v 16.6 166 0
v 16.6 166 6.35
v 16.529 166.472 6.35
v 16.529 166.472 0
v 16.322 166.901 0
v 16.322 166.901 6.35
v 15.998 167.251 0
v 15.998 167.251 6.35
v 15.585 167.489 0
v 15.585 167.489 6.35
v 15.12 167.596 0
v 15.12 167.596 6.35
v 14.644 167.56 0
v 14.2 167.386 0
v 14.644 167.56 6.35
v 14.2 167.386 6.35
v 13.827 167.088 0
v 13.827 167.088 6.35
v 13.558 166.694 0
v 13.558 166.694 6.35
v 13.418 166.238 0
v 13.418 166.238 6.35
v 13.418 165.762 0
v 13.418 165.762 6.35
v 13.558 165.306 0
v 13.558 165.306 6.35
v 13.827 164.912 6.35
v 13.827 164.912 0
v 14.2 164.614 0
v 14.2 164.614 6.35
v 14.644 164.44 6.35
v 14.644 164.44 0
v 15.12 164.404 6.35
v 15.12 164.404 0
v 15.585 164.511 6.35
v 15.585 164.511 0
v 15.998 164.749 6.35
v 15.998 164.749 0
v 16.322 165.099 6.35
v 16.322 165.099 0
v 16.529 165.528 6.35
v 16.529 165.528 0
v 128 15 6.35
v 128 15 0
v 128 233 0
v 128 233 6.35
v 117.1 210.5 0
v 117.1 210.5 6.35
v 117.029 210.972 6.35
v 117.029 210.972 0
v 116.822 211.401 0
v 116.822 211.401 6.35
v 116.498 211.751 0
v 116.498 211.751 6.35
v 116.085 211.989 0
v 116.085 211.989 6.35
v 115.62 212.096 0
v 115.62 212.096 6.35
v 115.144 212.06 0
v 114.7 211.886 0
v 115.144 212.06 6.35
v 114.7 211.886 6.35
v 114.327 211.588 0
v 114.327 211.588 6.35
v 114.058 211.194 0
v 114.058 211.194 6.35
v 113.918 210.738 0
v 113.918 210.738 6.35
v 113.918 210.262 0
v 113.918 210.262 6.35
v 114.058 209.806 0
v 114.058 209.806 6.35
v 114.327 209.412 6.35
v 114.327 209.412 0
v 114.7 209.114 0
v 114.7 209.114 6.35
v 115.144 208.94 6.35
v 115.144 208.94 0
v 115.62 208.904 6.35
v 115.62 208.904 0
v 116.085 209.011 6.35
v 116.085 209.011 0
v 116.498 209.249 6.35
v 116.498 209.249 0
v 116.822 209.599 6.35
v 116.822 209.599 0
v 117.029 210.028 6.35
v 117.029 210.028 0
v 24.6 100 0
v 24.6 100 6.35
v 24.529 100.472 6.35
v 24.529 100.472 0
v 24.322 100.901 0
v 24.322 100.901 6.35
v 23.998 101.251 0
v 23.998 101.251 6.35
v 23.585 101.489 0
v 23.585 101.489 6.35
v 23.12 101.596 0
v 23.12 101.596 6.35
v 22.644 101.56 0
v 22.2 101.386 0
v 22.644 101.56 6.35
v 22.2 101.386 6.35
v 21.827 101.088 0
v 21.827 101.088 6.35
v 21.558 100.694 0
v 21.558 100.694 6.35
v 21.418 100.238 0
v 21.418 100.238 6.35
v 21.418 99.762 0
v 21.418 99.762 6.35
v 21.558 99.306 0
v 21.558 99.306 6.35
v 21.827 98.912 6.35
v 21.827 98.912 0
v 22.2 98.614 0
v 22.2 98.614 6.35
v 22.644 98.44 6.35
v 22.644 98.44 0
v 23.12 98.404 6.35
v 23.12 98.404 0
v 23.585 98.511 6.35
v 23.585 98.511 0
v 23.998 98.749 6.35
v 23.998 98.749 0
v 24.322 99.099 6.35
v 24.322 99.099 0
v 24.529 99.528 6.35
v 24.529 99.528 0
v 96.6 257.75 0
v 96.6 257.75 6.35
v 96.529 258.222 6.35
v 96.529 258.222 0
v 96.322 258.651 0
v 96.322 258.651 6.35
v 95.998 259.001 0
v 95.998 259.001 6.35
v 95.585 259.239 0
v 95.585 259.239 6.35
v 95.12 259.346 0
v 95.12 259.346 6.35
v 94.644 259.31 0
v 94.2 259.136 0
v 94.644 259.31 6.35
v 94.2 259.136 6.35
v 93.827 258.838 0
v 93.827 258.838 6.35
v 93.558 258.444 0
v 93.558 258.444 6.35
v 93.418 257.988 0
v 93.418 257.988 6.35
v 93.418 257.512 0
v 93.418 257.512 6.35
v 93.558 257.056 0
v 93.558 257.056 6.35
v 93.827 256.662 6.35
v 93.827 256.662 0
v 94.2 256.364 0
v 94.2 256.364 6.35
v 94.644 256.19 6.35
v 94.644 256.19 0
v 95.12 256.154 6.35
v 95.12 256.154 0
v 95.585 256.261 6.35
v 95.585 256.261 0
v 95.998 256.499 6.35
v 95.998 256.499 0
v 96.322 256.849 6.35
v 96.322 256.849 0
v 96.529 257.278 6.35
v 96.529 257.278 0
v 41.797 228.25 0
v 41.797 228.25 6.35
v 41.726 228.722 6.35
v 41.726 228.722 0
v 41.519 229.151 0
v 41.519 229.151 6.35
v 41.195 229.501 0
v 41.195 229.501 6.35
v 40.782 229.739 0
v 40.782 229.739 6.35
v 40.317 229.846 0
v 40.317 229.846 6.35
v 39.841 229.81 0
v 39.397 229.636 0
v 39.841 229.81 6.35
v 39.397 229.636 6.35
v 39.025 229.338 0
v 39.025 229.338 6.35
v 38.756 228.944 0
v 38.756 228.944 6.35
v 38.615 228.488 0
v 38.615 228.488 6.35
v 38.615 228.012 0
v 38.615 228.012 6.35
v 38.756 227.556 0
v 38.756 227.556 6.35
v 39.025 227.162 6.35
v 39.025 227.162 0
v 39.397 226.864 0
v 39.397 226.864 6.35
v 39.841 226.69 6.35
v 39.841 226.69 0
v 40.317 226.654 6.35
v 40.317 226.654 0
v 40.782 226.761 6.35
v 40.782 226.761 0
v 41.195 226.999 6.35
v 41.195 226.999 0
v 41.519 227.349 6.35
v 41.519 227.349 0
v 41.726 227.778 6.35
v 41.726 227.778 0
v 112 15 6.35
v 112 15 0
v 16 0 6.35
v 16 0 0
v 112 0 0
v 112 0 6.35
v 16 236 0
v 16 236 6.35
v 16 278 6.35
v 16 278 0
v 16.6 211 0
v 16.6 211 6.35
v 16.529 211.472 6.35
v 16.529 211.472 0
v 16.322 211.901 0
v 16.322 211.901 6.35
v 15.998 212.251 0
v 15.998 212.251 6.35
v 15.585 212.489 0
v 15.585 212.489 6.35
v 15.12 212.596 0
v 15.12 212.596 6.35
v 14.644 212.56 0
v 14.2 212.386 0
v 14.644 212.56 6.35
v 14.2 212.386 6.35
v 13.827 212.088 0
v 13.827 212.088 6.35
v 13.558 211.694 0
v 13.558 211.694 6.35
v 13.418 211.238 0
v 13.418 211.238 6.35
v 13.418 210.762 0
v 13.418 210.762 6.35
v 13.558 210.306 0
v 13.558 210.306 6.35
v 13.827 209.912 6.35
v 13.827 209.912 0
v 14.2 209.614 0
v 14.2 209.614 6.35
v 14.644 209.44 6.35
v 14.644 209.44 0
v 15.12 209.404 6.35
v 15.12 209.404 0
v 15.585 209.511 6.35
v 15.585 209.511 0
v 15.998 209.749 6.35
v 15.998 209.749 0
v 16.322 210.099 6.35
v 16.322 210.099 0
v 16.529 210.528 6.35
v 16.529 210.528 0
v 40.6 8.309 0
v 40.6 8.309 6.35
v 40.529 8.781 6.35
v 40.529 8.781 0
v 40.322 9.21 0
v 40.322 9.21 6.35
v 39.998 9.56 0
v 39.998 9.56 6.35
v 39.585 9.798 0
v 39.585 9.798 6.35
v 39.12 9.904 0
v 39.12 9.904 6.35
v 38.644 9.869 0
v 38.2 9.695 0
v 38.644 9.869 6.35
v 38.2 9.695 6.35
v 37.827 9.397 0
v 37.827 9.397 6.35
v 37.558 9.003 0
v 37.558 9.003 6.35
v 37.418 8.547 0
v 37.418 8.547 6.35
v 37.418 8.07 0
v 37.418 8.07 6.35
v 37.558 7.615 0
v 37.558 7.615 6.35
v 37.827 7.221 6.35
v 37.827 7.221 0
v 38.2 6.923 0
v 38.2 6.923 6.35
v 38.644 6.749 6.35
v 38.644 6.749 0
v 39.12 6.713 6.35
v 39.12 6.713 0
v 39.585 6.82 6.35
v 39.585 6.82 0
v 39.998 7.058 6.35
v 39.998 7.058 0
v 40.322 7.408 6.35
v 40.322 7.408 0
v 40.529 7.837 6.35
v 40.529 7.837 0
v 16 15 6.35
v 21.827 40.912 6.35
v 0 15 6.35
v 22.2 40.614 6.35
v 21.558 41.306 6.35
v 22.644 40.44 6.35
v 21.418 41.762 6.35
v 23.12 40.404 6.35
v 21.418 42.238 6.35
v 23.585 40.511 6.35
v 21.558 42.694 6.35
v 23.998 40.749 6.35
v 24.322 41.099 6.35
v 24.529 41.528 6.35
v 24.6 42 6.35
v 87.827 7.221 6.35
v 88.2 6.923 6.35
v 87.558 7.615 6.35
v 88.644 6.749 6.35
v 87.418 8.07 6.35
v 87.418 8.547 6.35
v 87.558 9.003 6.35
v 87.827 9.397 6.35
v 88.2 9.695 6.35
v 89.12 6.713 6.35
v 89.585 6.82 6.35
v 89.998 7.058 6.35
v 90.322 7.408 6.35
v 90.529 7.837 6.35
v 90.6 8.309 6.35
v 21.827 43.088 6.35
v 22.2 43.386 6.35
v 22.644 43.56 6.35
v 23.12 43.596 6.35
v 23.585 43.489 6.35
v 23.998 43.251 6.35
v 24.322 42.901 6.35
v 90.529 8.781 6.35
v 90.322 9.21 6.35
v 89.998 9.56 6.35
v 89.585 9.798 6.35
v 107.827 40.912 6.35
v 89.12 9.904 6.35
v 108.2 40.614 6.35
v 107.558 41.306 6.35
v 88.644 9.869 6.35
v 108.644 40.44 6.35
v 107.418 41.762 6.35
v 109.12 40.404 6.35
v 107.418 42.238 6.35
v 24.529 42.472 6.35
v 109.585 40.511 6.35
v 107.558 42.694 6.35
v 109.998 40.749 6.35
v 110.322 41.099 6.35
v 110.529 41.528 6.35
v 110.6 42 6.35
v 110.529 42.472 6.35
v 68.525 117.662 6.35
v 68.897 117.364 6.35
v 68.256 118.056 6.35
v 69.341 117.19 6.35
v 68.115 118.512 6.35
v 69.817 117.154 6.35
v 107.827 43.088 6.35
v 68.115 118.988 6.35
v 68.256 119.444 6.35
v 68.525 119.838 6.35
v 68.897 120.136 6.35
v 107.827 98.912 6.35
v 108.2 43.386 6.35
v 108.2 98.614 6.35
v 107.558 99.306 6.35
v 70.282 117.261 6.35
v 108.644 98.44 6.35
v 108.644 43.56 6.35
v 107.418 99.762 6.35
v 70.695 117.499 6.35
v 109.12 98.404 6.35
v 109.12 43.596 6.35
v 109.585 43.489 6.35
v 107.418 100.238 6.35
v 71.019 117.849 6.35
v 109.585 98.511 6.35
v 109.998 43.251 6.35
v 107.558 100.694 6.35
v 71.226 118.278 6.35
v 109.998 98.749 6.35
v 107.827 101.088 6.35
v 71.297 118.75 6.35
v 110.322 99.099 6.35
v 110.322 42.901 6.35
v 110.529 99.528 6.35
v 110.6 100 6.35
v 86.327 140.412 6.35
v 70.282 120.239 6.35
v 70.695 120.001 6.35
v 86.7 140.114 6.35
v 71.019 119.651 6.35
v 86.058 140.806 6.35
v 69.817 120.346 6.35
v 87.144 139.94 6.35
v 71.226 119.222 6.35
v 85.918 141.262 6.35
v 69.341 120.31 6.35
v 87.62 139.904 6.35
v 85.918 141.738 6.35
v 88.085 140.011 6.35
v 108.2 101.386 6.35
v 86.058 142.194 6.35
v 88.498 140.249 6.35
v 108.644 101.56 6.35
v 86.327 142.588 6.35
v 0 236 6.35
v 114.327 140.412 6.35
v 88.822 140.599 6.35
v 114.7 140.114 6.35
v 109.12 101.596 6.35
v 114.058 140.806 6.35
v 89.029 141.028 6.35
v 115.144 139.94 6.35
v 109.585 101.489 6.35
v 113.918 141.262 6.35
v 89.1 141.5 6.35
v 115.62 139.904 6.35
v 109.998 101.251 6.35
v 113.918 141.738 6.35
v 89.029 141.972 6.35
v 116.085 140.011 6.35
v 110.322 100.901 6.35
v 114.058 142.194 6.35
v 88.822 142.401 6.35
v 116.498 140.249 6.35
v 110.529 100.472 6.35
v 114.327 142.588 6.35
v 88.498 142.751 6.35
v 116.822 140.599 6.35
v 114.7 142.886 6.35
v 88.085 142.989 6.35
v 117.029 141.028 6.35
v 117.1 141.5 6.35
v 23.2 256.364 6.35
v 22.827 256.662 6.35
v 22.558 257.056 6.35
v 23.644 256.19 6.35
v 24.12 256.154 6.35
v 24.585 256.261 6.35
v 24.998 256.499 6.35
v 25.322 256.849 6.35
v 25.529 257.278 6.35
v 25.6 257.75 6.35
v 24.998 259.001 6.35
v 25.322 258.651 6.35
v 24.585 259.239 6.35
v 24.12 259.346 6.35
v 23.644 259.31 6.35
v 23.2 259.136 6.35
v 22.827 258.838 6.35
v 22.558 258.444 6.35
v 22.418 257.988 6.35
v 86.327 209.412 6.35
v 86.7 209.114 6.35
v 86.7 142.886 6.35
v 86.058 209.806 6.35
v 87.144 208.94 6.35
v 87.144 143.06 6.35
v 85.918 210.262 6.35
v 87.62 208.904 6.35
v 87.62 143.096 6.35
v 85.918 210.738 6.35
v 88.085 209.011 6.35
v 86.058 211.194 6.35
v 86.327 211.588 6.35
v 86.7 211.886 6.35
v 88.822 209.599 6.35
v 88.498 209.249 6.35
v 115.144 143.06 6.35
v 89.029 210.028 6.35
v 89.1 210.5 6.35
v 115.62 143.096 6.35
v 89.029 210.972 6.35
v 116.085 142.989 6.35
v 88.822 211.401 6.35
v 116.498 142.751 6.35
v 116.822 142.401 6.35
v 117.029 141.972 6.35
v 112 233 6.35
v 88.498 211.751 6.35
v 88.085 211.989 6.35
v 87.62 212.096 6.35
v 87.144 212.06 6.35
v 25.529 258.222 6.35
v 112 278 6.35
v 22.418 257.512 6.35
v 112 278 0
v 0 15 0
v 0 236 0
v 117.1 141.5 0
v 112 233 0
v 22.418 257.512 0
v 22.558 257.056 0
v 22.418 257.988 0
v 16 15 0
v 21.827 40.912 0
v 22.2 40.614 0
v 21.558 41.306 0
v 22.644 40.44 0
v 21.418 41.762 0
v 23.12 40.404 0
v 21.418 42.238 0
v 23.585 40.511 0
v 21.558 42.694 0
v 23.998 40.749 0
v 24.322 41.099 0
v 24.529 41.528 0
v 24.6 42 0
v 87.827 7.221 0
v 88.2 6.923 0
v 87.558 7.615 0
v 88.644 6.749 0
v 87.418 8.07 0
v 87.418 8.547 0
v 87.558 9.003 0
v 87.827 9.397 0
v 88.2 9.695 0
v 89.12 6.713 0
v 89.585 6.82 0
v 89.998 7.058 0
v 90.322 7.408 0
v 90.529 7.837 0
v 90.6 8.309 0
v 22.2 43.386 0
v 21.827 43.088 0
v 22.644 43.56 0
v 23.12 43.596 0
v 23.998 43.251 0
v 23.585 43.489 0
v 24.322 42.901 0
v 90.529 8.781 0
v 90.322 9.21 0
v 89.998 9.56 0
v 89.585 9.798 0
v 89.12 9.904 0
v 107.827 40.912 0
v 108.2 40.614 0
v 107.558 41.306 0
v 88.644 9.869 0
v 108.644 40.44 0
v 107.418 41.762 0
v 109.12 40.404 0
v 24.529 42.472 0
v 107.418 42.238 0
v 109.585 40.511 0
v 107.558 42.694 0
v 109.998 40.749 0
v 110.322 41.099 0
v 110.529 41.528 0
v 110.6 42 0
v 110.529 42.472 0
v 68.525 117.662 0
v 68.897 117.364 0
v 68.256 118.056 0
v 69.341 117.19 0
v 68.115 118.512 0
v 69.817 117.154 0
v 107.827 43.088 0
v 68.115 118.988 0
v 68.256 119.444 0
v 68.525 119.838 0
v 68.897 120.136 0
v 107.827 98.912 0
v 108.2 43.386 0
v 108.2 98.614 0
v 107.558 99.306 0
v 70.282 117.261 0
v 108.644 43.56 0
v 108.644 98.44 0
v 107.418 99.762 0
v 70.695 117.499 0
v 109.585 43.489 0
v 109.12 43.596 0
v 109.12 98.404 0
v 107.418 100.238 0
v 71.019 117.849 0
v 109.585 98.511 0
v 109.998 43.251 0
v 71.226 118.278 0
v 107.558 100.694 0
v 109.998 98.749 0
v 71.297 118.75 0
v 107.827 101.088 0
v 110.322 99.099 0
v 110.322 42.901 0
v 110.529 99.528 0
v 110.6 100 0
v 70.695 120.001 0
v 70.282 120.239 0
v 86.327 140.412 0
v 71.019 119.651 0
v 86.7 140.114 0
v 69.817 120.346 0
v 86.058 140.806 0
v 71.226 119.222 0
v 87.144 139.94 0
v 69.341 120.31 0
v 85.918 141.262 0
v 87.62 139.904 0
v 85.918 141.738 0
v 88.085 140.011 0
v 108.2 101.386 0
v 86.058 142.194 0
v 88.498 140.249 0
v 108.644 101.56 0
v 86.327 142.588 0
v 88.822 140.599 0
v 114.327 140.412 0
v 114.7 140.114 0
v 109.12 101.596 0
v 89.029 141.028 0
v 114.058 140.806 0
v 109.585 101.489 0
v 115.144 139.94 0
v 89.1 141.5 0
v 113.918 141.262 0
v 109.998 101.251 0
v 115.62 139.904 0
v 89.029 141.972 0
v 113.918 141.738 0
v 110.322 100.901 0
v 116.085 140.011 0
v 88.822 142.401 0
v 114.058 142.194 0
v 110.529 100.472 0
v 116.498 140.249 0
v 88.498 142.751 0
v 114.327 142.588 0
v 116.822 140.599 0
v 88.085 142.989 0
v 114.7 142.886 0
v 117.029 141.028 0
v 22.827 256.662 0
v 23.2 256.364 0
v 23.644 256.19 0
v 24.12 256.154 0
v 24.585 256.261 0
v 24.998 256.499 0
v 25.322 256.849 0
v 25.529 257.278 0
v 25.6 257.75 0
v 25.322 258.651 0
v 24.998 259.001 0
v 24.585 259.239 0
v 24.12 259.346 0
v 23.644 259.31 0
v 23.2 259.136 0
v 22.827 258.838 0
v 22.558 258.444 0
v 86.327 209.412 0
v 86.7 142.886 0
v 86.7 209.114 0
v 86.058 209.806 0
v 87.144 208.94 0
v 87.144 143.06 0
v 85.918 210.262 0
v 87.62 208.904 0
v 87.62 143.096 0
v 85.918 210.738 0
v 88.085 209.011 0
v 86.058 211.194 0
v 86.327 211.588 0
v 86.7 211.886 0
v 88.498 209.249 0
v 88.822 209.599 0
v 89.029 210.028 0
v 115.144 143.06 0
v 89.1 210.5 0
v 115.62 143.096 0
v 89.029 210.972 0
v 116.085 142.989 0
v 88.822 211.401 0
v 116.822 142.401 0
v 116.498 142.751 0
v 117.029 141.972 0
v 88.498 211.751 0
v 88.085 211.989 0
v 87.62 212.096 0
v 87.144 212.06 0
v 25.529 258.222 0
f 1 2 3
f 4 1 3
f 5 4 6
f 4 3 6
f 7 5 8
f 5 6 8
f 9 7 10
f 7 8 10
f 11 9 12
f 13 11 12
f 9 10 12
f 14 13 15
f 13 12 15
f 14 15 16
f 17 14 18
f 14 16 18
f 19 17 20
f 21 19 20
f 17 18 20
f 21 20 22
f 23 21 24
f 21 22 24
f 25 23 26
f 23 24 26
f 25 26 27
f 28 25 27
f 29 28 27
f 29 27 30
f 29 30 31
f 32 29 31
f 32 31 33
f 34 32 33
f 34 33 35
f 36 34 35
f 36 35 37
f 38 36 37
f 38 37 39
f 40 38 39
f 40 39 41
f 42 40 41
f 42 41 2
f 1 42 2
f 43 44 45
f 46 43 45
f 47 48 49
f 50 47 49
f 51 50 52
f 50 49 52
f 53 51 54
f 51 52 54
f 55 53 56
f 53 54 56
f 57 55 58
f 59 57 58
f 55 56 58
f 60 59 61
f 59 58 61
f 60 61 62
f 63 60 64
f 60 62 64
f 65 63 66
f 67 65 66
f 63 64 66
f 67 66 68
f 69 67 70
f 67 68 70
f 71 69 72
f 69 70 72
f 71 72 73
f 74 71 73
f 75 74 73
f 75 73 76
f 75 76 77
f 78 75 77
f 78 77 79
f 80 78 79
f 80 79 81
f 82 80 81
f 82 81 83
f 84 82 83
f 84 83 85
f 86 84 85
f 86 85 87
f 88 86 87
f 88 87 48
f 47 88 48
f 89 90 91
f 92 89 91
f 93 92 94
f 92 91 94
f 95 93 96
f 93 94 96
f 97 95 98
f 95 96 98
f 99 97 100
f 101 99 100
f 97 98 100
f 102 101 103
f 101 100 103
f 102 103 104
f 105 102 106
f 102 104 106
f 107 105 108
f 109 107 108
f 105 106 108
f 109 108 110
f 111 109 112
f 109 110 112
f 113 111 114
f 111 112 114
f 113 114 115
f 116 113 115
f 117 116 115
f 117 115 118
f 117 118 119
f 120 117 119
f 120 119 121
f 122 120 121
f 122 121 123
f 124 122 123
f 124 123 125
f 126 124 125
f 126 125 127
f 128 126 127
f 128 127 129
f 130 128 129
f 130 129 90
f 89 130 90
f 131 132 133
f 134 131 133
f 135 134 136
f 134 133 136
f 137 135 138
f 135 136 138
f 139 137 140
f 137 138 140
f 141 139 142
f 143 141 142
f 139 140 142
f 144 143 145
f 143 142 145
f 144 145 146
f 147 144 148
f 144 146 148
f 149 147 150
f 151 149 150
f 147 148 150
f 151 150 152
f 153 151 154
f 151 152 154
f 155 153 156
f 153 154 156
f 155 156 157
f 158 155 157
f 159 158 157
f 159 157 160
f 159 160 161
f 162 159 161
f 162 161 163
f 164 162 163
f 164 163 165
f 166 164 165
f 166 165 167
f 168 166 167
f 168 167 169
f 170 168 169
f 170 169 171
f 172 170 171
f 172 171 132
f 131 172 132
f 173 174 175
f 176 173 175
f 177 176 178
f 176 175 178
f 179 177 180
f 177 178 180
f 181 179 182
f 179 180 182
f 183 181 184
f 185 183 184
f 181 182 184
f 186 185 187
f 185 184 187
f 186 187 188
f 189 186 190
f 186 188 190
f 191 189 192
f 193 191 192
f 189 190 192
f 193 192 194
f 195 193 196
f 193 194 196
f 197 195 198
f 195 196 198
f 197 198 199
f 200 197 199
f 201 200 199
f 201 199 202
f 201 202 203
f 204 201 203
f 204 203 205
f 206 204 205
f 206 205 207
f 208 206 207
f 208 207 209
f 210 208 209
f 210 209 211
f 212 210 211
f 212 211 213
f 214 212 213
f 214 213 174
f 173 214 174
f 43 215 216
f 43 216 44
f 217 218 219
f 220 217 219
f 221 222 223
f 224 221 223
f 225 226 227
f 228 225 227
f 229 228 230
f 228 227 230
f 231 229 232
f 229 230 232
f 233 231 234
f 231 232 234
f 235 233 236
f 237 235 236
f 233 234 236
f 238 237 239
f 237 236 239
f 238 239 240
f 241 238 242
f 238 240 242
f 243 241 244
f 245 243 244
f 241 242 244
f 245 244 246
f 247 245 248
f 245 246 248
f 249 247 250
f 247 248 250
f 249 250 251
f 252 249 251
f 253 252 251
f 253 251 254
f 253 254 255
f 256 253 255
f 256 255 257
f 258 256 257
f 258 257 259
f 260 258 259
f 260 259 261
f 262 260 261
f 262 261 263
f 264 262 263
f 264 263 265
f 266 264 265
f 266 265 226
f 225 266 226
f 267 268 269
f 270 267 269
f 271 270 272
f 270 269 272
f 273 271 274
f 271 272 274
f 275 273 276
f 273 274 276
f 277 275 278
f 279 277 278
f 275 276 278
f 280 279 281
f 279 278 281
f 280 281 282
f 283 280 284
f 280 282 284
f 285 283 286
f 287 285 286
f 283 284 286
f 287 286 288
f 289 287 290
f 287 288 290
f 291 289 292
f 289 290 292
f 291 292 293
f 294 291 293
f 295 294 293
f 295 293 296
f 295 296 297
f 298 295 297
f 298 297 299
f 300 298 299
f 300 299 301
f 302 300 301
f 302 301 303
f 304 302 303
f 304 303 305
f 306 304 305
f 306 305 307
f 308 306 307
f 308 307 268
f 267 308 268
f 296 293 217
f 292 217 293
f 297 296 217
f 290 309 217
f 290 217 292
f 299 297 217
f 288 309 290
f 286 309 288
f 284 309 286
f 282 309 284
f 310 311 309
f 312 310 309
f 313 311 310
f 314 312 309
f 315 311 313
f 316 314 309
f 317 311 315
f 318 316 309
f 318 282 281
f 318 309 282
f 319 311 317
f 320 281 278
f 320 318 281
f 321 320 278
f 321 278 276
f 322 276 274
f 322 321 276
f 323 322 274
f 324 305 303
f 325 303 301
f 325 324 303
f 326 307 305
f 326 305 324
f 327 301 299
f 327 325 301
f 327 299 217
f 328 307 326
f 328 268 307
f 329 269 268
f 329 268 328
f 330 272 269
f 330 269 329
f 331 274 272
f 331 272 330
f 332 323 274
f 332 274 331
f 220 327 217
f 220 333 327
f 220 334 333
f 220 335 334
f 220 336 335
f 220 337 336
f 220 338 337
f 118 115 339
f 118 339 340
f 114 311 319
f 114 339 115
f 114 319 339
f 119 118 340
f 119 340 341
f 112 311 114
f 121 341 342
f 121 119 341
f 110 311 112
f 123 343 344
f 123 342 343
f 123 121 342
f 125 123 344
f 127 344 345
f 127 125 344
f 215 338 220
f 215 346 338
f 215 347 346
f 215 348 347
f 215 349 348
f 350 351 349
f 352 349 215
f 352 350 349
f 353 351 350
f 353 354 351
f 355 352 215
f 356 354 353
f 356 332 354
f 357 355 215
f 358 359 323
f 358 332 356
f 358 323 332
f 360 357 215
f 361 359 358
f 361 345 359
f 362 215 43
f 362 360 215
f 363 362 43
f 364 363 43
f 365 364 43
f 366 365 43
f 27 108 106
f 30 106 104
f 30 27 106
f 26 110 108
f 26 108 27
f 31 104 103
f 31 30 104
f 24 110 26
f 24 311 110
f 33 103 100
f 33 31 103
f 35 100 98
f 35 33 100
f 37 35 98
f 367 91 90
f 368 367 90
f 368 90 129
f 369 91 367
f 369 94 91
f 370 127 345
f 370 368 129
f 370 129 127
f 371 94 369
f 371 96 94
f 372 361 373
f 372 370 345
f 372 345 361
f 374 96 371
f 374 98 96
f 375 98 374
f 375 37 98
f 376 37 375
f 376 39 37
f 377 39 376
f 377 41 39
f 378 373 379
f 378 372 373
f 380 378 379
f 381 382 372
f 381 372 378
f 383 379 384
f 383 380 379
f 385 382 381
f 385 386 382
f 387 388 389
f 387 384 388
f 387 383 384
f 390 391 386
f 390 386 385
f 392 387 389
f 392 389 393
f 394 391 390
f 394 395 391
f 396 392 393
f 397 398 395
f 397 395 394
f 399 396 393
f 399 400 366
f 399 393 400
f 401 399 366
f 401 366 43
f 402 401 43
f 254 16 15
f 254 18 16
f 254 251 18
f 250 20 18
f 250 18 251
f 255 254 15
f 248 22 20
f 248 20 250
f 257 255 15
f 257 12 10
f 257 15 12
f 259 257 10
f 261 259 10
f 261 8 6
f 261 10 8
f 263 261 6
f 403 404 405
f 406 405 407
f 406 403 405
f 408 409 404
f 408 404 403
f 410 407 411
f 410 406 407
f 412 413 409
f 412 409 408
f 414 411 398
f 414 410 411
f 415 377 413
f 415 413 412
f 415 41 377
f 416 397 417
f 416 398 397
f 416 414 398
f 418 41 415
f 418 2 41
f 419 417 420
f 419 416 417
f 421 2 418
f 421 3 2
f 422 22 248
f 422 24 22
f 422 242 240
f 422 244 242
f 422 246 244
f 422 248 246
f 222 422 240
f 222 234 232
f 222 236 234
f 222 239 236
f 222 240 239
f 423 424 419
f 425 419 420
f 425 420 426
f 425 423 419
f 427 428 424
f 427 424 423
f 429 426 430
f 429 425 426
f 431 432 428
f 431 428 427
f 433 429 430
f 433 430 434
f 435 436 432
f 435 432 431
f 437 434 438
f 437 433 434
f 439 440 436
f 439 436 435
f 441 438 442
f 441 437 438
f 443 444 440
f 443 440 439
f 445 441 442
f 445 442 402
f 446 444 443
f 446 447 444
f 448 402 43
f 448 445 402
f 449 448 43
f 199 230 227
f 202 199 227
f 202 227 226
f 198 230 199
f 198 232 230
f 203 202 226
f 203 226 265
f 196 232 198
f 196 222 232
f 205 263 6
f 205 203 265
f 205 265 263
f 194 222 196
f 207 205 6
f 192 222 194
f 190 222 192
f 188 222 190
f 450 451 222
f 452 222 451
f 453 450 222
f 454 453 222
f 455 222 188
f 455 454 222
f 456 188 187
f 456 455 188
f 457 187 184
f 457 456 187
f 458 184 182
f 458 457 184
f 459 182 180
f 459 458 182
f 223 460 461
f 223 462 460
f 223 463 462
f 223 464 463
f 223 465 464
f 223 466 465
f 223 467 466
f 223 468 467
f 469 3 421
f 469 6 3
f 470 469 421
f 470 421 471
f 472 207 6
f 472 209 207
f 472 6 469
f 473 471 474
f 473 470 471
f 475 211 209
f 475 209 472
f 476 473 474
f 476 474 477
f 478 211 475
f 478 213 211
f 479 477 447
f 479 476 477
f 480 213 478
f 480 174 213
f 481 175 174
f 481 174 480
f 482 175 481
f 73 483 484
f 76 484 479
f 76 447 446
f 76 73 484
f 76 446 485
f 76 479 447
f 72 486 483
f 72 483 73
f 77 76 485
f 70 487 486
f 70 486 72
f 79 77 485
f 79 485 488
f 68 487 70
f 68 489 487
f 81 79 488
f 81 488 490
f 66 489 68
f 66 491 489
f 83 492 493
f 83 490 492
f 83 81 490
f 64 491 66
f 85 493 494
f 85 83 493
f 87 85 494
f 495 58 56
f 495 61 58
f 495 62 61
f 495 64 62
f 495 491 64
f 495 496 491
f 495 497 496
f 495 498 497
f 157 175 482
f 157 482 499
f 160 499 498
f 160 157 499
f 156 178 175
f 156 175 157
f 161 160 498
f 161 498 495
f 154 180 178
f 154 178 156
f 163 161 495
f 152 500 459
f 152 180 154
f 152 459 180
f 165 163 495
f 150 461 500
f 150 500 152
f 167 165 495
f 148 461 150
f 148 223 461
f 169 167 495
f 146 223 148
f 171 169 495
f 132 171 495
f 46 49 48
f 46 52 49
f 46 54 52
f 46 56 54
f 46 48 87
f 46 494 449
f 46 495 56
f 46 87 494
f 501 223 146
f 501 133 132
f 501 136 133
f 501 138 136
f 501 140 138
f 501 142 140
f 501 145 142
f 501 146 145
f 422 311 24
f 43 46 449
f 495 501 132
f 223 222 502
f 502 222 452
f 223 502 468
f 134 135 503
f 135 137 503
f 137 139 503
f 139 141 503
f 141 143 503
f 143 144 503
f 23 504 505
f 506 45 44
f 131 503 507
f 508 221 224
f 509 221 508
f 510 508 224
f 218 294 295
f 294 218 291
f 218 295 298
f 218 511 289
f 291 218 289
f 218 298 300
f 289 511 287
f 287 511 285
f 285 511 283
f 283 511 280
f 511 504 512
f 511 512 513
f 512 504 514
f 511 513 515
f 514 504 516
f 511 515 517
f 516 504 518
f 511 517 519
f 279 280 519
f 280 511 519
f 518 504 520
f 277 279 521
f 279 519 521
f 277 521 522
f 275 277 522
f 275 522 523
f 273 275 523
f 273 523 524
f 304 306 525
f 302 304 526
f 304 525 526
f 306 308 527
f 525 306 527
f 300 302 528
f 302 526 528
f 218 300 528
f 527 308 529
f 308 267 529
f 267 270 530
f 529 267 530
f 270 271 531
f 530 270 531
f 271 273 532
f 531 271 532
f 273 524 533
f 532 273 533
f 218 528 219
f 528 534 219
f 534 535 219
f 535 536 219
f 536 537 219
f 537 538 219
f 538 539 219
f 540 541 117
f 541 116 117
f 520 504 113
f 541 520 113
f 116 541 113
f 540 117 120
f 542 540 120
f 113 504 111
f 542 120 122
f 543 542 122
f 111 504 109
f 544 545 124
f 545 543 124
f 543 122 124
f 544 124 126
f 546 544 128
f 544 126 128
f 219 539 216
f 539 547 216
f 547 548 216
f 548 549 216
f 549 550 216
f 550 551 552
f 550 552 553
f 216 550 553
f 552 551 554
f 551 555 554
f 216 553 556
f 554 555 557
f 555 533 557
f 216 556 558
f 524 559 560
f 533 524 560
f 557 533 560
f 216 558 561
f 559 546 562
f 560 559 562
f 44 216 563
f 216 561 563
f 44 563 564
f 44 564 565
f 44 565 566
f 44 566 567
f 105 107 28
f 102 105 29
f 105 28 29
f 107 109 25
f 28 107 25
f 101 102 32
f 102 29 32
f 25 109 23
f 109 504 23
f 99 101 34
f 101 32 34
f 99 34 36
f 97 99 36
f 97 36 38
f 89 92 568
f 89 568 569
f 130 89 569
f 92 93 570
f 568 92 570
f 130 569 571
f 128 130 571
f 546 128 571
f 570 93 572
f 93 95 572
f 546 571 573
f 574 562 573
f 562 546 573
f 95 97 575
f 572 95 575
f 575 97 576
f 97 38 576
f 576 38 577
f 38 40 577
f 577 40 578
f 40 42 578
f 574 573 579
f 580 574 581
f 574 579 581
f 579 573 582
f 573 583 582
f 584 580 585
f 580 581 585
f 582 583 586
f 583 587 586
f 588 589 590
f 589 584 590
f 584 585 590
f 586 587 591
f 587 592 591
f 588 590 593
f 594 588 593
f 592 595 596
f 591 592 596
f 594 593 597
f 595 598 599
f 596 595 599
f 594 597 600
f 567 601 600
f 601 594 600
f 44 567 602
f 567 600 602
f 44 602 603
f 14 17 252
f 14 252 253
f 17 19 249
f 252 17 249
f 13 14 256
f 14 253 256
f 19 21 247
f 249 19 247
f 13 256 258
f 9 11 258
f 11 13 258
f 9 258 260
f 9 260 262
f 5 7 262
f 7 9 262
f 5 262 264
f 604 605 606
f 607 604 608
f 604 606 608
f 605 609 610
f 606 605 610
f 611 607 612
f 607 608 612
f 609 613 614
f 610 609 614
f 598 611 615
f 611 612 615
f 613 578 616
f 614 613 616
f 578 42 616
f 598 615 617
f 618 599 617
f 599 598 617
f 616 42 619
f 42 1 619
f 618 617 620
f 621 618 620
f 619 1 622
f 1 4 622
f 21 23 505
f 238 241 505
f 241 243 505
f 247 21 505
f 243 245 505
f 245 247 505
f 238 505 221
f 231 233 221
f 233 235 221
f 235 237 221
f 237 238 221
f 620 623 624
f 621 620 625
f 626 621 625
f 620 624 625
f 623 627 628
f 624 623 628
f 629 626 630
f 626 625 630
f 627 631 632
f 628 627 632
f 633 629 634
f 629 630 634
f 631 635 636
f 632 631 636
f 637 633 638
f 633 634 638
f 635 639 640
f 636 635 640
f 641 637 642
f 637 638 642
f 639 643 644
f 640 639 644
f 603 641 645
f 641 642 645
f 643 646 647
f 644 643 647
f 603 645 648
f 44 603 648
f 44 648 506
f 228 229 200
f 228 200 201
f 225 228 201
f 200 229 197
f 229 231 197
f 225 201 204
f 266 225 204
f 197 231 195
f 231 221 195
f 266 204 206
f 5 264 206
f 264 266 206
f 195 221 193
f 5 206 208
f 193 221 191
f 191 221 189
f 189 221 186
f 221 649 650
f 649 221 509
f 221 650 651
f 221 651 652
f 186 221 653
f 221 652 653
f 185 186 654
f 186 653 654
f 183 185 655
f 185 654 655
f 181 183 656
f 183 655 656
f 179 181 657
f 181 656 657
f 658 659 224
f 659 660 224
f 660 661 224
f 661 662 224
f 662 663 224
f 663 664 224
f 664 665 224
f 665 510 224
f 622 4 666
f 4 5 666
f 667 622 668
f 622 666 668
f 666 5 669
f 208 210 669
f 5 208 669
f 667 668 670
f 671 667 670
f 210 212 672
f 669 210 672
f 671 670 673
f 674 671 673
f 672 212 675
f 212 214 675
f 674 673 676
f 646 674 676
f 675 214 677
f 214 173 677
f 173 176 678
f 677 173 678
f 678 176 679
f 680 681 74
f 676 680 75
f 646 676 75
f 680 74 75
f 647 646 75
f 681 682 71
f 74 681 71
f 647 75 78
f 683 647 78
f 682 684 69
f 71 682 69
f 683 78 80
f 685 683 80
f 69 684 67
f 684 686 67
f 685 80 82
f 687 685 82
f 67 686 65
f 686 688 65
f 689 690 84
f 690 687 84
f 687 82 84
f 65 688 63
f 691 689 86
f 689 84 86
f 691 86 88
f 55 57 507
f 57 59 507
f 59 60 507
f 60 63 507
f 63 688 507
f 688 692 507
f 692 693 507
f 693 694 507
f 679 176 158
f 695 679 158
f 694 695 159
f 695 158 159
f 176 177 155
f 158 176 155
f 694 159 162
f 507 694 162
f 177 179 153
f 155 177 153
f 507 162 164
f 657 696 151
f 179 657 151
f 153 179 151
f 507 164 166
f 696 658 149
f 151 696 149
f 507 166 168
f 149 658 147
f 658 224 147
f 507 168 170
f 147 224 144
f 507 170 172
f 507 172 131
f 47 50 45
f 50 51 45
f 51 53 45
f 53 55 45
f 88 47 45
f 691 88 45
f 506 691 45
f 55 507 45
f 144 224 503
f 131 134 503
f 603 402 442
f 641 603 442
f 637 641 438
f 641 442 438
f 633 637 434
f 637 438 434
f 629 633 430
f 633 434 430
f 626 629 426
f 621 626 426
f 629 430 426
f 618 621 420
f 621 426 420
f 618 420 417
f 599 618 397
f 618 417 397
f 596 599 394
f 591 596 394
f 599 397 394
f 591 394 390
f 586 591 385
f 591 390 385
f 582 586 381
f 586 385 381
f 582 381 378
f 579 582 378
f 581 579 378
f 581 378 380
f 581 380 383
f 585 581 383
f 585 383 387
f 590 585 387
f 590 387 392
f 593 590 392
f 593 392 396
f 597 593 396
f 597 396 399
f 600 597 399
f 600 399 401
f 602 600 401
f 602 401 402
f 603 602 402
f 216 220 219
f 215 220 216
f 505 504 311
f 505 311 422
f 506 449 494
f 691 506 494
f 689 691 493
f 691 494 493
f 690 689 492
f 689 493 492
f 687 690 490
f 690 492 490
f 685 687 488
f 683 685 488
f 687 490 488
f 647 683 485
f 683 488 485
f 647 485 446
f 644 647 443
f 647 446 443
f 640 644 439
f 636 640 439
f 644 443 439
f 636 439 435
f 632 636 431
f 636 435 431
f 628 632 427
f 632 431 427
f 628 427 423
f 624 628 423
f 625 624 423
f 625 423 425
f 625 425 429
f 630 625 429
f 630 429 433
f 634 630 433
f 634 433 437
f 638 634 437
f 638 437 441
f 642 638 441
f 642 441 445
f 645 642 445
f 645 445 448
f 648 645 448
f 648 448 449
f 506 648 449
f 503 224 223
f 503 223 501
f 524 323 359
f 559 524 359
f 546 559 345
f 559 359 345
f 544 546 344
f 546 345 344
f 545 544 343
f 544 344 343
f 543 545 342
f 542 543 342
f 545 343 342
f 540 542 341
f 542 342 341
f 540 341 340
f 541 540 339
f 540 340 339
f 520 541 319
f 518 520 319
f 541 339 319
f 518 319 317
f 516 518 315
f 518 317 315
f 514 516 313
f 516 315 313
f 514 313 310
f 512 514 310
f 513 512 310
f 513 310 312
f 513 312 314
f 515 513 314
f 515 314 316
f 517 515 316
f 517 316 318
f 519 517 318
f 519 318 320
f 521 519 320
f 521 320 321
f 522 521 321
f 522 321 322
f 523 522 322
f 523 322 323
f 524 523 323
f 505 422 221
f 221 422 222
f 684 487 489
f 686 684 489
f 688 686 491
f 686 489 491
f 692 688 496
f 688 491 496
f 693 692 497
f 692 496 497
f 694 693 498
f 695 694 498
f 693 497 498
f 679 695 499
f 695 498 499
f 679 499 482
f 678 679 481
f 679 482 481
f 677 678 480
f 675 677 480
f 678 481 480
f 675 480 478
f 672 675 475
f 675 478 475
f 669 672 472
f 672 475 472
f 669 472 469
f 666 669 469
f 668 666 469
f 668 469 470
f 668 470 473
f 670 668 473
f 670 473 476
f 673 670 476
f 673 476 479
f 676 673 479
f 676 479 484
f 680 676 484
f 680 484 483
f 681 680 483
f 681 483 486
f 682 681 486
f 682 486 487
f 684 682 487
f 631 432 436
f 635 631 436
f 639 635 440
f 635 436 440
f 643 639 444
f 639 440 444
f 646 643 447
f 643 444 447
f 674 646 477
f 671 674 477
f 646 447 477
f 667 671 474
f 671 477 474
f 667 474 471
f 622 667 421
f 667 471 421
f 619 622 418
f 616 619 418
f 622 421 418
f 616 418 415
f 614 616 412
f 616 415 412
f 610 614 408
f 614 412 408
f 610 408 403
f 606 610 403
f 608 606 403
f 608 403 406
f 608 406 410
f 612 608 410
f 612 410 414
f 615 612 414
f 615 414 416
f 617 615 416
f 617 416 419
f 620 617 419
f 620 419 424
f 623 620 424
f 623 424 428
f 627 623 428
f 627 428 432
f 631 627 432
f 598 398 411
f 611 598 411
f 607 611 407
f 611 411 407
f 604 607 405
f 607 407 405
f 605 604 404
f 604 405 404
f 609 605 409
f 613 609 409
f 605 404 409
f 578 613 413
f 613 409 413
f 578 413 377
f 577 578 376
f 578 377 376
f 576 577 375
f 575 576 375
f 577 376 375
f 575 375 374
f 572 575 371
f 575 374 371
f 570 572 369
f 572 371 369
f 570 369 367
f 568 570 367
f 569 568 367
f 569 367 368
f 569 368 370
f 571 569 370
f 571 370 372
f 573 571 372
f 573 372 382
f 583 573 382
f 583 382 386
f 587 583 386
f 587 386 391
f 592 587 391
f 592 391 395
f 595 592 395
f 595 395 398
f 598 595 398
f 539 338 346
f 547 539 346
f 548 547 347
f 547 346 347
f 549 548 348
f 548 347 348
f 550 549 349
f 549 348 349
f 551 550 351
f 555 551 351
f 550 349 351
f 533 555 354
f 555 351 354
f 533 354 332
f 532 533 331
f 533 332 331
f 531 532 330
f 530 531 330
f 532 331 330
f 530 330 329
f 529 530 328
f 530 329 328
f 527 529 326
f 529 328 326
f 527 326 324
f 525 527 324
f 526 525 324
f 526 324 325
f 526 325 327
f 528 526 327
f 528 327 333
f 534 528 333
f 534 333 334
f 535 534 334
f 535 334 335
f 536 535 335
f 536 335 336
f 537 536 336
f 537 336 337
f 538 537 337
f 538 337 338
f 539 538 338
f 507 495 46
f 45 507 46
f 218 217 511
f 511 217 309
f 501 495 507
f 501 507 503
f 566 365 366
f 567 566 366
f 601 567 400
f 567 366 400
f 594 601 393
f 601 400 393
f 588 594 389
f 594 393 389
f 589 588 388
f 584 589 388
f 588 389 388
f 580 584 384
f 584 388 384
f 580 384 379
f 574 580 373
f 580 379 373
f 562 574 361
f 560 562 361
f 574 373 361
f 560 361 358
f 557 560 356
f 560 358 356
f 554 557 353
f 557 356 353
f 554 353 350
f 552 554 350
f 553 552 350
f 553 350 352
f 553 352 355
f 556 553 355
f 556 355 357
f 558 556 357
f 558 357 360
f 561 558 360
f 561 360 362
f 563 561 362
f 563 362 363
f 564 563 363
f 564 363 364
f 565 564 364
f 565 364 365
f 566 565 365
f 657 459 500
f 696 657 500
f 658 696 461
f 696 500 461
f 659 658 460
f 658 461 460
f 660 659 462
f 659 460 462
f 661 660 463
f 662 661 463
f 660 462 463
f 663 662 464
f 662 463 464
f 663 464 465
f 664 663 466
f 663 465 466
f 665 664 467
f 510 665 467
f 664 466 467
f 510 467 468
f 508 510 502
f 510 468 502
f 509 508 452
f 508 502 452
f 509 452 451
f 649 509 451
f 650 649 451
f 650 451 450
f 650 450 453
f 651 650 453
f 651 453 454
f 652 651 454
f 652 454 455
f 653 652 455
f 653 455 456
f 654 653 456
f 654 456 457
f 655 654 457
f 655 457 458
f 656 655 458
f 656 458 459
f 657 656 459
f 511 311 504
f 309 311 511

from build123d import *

# Parameters (mm, degrees)
SKETCH1_W           = 128
SKETCH1_H           = 278
BOSS_EXTRUDE1_DEPTH = 6.35
SKETCH2_W           = 16
SKETCH2_H           = 42
SKETCH2_H_2         = 45
SKETCH2_H_3         = 15
CUT_EXTRUDE1_DEPTH  = 31.7625
SKETCH5_R           = 1.6
CUT_EXTRUDE3_DEPTH  = 10


with BuildPart() as part:
    # Sketch1 → Boss-Extrude1 (new body)
    with BuildSketch(Plane.XY):
        with Locations((64, 139)):
            Rectangle(SKETCH1_W, SKETCH1_H)
    extrude(amount=BOSS_EXTRUDE1_DEPTH)

    # Sketch2 → Cut-Extrude1 (cut)
    with BuildSketch(Plane.XY.offset(6.35)):
        with Locations((8, 257)):
            Rectangle(SKETCH2_W, SKETCH2_H)
        with Locations((120, 255.5)):
            Rectangle(SKETCH2_W, SKETCH2_H_2)
        with Locations((120, 7.5)):
            Rectangle(SKETCH2_W, SKETCH2_H_3)
        with Locations((8, 7.5)):
            Rectangle(SKETCH2_W, SKETCH2_H_3)
    extrude(amount=-CUT_EXTRUDE1_DEPTH, mode=Mode.SUBTRACT)

    # Sketch5 → Cut-Extrude3 (cut)
    with BuildSketch(Plane.XY.offset(6.35)):
        with Locations((24, 257.75)):
            Circle(SKETCH5_R)
        with Locations((95, 257.75)):
            Circle(SKETCH5_R)
        with Locations((87.5, 210.5)):
            Circle(SKETCH5_R)
        with Locations((115.5, 210.5)):
            Circle(SKETCH5_R)
        with Locations((87.5, 141.5)):
            Circle(SKETCH5_R)
        with Locations((115.5, 141.5)):
            Circle(SKETCH5_R)
        with Locations((69.697400928, 118.75)):
            Circle(SKETCH5_R)
        with Locations((40.197400928, 228.25)):
            Circle(SKETCH5_R)
        with Locations((15, 211)):
            Circle(SKETCH5_R)
        with Locations((15, 166)):
            Circle(SKETCH5_R)
        with Locations((39, 8.308927031)):
            Circle(SKETCH5_R)
        with Locations((89, 8.308927031)):
            Circle(SKETCH5_R)
        with Locations((23, 100)):
            Circle(SKETCH5_R)
        with Locations((23, 42)):
            Circle(SKETCH5_R)
        with Locations((109, 42)):
            Circle(SKETCH5_R)
        with Locations((109, 100)):
            Circle(SKETCH5_R)
    extrude(amount=-CUT_EXTRUDE3_DEPTH, mode=Mode.SUBTRACT)


solid = part.part
